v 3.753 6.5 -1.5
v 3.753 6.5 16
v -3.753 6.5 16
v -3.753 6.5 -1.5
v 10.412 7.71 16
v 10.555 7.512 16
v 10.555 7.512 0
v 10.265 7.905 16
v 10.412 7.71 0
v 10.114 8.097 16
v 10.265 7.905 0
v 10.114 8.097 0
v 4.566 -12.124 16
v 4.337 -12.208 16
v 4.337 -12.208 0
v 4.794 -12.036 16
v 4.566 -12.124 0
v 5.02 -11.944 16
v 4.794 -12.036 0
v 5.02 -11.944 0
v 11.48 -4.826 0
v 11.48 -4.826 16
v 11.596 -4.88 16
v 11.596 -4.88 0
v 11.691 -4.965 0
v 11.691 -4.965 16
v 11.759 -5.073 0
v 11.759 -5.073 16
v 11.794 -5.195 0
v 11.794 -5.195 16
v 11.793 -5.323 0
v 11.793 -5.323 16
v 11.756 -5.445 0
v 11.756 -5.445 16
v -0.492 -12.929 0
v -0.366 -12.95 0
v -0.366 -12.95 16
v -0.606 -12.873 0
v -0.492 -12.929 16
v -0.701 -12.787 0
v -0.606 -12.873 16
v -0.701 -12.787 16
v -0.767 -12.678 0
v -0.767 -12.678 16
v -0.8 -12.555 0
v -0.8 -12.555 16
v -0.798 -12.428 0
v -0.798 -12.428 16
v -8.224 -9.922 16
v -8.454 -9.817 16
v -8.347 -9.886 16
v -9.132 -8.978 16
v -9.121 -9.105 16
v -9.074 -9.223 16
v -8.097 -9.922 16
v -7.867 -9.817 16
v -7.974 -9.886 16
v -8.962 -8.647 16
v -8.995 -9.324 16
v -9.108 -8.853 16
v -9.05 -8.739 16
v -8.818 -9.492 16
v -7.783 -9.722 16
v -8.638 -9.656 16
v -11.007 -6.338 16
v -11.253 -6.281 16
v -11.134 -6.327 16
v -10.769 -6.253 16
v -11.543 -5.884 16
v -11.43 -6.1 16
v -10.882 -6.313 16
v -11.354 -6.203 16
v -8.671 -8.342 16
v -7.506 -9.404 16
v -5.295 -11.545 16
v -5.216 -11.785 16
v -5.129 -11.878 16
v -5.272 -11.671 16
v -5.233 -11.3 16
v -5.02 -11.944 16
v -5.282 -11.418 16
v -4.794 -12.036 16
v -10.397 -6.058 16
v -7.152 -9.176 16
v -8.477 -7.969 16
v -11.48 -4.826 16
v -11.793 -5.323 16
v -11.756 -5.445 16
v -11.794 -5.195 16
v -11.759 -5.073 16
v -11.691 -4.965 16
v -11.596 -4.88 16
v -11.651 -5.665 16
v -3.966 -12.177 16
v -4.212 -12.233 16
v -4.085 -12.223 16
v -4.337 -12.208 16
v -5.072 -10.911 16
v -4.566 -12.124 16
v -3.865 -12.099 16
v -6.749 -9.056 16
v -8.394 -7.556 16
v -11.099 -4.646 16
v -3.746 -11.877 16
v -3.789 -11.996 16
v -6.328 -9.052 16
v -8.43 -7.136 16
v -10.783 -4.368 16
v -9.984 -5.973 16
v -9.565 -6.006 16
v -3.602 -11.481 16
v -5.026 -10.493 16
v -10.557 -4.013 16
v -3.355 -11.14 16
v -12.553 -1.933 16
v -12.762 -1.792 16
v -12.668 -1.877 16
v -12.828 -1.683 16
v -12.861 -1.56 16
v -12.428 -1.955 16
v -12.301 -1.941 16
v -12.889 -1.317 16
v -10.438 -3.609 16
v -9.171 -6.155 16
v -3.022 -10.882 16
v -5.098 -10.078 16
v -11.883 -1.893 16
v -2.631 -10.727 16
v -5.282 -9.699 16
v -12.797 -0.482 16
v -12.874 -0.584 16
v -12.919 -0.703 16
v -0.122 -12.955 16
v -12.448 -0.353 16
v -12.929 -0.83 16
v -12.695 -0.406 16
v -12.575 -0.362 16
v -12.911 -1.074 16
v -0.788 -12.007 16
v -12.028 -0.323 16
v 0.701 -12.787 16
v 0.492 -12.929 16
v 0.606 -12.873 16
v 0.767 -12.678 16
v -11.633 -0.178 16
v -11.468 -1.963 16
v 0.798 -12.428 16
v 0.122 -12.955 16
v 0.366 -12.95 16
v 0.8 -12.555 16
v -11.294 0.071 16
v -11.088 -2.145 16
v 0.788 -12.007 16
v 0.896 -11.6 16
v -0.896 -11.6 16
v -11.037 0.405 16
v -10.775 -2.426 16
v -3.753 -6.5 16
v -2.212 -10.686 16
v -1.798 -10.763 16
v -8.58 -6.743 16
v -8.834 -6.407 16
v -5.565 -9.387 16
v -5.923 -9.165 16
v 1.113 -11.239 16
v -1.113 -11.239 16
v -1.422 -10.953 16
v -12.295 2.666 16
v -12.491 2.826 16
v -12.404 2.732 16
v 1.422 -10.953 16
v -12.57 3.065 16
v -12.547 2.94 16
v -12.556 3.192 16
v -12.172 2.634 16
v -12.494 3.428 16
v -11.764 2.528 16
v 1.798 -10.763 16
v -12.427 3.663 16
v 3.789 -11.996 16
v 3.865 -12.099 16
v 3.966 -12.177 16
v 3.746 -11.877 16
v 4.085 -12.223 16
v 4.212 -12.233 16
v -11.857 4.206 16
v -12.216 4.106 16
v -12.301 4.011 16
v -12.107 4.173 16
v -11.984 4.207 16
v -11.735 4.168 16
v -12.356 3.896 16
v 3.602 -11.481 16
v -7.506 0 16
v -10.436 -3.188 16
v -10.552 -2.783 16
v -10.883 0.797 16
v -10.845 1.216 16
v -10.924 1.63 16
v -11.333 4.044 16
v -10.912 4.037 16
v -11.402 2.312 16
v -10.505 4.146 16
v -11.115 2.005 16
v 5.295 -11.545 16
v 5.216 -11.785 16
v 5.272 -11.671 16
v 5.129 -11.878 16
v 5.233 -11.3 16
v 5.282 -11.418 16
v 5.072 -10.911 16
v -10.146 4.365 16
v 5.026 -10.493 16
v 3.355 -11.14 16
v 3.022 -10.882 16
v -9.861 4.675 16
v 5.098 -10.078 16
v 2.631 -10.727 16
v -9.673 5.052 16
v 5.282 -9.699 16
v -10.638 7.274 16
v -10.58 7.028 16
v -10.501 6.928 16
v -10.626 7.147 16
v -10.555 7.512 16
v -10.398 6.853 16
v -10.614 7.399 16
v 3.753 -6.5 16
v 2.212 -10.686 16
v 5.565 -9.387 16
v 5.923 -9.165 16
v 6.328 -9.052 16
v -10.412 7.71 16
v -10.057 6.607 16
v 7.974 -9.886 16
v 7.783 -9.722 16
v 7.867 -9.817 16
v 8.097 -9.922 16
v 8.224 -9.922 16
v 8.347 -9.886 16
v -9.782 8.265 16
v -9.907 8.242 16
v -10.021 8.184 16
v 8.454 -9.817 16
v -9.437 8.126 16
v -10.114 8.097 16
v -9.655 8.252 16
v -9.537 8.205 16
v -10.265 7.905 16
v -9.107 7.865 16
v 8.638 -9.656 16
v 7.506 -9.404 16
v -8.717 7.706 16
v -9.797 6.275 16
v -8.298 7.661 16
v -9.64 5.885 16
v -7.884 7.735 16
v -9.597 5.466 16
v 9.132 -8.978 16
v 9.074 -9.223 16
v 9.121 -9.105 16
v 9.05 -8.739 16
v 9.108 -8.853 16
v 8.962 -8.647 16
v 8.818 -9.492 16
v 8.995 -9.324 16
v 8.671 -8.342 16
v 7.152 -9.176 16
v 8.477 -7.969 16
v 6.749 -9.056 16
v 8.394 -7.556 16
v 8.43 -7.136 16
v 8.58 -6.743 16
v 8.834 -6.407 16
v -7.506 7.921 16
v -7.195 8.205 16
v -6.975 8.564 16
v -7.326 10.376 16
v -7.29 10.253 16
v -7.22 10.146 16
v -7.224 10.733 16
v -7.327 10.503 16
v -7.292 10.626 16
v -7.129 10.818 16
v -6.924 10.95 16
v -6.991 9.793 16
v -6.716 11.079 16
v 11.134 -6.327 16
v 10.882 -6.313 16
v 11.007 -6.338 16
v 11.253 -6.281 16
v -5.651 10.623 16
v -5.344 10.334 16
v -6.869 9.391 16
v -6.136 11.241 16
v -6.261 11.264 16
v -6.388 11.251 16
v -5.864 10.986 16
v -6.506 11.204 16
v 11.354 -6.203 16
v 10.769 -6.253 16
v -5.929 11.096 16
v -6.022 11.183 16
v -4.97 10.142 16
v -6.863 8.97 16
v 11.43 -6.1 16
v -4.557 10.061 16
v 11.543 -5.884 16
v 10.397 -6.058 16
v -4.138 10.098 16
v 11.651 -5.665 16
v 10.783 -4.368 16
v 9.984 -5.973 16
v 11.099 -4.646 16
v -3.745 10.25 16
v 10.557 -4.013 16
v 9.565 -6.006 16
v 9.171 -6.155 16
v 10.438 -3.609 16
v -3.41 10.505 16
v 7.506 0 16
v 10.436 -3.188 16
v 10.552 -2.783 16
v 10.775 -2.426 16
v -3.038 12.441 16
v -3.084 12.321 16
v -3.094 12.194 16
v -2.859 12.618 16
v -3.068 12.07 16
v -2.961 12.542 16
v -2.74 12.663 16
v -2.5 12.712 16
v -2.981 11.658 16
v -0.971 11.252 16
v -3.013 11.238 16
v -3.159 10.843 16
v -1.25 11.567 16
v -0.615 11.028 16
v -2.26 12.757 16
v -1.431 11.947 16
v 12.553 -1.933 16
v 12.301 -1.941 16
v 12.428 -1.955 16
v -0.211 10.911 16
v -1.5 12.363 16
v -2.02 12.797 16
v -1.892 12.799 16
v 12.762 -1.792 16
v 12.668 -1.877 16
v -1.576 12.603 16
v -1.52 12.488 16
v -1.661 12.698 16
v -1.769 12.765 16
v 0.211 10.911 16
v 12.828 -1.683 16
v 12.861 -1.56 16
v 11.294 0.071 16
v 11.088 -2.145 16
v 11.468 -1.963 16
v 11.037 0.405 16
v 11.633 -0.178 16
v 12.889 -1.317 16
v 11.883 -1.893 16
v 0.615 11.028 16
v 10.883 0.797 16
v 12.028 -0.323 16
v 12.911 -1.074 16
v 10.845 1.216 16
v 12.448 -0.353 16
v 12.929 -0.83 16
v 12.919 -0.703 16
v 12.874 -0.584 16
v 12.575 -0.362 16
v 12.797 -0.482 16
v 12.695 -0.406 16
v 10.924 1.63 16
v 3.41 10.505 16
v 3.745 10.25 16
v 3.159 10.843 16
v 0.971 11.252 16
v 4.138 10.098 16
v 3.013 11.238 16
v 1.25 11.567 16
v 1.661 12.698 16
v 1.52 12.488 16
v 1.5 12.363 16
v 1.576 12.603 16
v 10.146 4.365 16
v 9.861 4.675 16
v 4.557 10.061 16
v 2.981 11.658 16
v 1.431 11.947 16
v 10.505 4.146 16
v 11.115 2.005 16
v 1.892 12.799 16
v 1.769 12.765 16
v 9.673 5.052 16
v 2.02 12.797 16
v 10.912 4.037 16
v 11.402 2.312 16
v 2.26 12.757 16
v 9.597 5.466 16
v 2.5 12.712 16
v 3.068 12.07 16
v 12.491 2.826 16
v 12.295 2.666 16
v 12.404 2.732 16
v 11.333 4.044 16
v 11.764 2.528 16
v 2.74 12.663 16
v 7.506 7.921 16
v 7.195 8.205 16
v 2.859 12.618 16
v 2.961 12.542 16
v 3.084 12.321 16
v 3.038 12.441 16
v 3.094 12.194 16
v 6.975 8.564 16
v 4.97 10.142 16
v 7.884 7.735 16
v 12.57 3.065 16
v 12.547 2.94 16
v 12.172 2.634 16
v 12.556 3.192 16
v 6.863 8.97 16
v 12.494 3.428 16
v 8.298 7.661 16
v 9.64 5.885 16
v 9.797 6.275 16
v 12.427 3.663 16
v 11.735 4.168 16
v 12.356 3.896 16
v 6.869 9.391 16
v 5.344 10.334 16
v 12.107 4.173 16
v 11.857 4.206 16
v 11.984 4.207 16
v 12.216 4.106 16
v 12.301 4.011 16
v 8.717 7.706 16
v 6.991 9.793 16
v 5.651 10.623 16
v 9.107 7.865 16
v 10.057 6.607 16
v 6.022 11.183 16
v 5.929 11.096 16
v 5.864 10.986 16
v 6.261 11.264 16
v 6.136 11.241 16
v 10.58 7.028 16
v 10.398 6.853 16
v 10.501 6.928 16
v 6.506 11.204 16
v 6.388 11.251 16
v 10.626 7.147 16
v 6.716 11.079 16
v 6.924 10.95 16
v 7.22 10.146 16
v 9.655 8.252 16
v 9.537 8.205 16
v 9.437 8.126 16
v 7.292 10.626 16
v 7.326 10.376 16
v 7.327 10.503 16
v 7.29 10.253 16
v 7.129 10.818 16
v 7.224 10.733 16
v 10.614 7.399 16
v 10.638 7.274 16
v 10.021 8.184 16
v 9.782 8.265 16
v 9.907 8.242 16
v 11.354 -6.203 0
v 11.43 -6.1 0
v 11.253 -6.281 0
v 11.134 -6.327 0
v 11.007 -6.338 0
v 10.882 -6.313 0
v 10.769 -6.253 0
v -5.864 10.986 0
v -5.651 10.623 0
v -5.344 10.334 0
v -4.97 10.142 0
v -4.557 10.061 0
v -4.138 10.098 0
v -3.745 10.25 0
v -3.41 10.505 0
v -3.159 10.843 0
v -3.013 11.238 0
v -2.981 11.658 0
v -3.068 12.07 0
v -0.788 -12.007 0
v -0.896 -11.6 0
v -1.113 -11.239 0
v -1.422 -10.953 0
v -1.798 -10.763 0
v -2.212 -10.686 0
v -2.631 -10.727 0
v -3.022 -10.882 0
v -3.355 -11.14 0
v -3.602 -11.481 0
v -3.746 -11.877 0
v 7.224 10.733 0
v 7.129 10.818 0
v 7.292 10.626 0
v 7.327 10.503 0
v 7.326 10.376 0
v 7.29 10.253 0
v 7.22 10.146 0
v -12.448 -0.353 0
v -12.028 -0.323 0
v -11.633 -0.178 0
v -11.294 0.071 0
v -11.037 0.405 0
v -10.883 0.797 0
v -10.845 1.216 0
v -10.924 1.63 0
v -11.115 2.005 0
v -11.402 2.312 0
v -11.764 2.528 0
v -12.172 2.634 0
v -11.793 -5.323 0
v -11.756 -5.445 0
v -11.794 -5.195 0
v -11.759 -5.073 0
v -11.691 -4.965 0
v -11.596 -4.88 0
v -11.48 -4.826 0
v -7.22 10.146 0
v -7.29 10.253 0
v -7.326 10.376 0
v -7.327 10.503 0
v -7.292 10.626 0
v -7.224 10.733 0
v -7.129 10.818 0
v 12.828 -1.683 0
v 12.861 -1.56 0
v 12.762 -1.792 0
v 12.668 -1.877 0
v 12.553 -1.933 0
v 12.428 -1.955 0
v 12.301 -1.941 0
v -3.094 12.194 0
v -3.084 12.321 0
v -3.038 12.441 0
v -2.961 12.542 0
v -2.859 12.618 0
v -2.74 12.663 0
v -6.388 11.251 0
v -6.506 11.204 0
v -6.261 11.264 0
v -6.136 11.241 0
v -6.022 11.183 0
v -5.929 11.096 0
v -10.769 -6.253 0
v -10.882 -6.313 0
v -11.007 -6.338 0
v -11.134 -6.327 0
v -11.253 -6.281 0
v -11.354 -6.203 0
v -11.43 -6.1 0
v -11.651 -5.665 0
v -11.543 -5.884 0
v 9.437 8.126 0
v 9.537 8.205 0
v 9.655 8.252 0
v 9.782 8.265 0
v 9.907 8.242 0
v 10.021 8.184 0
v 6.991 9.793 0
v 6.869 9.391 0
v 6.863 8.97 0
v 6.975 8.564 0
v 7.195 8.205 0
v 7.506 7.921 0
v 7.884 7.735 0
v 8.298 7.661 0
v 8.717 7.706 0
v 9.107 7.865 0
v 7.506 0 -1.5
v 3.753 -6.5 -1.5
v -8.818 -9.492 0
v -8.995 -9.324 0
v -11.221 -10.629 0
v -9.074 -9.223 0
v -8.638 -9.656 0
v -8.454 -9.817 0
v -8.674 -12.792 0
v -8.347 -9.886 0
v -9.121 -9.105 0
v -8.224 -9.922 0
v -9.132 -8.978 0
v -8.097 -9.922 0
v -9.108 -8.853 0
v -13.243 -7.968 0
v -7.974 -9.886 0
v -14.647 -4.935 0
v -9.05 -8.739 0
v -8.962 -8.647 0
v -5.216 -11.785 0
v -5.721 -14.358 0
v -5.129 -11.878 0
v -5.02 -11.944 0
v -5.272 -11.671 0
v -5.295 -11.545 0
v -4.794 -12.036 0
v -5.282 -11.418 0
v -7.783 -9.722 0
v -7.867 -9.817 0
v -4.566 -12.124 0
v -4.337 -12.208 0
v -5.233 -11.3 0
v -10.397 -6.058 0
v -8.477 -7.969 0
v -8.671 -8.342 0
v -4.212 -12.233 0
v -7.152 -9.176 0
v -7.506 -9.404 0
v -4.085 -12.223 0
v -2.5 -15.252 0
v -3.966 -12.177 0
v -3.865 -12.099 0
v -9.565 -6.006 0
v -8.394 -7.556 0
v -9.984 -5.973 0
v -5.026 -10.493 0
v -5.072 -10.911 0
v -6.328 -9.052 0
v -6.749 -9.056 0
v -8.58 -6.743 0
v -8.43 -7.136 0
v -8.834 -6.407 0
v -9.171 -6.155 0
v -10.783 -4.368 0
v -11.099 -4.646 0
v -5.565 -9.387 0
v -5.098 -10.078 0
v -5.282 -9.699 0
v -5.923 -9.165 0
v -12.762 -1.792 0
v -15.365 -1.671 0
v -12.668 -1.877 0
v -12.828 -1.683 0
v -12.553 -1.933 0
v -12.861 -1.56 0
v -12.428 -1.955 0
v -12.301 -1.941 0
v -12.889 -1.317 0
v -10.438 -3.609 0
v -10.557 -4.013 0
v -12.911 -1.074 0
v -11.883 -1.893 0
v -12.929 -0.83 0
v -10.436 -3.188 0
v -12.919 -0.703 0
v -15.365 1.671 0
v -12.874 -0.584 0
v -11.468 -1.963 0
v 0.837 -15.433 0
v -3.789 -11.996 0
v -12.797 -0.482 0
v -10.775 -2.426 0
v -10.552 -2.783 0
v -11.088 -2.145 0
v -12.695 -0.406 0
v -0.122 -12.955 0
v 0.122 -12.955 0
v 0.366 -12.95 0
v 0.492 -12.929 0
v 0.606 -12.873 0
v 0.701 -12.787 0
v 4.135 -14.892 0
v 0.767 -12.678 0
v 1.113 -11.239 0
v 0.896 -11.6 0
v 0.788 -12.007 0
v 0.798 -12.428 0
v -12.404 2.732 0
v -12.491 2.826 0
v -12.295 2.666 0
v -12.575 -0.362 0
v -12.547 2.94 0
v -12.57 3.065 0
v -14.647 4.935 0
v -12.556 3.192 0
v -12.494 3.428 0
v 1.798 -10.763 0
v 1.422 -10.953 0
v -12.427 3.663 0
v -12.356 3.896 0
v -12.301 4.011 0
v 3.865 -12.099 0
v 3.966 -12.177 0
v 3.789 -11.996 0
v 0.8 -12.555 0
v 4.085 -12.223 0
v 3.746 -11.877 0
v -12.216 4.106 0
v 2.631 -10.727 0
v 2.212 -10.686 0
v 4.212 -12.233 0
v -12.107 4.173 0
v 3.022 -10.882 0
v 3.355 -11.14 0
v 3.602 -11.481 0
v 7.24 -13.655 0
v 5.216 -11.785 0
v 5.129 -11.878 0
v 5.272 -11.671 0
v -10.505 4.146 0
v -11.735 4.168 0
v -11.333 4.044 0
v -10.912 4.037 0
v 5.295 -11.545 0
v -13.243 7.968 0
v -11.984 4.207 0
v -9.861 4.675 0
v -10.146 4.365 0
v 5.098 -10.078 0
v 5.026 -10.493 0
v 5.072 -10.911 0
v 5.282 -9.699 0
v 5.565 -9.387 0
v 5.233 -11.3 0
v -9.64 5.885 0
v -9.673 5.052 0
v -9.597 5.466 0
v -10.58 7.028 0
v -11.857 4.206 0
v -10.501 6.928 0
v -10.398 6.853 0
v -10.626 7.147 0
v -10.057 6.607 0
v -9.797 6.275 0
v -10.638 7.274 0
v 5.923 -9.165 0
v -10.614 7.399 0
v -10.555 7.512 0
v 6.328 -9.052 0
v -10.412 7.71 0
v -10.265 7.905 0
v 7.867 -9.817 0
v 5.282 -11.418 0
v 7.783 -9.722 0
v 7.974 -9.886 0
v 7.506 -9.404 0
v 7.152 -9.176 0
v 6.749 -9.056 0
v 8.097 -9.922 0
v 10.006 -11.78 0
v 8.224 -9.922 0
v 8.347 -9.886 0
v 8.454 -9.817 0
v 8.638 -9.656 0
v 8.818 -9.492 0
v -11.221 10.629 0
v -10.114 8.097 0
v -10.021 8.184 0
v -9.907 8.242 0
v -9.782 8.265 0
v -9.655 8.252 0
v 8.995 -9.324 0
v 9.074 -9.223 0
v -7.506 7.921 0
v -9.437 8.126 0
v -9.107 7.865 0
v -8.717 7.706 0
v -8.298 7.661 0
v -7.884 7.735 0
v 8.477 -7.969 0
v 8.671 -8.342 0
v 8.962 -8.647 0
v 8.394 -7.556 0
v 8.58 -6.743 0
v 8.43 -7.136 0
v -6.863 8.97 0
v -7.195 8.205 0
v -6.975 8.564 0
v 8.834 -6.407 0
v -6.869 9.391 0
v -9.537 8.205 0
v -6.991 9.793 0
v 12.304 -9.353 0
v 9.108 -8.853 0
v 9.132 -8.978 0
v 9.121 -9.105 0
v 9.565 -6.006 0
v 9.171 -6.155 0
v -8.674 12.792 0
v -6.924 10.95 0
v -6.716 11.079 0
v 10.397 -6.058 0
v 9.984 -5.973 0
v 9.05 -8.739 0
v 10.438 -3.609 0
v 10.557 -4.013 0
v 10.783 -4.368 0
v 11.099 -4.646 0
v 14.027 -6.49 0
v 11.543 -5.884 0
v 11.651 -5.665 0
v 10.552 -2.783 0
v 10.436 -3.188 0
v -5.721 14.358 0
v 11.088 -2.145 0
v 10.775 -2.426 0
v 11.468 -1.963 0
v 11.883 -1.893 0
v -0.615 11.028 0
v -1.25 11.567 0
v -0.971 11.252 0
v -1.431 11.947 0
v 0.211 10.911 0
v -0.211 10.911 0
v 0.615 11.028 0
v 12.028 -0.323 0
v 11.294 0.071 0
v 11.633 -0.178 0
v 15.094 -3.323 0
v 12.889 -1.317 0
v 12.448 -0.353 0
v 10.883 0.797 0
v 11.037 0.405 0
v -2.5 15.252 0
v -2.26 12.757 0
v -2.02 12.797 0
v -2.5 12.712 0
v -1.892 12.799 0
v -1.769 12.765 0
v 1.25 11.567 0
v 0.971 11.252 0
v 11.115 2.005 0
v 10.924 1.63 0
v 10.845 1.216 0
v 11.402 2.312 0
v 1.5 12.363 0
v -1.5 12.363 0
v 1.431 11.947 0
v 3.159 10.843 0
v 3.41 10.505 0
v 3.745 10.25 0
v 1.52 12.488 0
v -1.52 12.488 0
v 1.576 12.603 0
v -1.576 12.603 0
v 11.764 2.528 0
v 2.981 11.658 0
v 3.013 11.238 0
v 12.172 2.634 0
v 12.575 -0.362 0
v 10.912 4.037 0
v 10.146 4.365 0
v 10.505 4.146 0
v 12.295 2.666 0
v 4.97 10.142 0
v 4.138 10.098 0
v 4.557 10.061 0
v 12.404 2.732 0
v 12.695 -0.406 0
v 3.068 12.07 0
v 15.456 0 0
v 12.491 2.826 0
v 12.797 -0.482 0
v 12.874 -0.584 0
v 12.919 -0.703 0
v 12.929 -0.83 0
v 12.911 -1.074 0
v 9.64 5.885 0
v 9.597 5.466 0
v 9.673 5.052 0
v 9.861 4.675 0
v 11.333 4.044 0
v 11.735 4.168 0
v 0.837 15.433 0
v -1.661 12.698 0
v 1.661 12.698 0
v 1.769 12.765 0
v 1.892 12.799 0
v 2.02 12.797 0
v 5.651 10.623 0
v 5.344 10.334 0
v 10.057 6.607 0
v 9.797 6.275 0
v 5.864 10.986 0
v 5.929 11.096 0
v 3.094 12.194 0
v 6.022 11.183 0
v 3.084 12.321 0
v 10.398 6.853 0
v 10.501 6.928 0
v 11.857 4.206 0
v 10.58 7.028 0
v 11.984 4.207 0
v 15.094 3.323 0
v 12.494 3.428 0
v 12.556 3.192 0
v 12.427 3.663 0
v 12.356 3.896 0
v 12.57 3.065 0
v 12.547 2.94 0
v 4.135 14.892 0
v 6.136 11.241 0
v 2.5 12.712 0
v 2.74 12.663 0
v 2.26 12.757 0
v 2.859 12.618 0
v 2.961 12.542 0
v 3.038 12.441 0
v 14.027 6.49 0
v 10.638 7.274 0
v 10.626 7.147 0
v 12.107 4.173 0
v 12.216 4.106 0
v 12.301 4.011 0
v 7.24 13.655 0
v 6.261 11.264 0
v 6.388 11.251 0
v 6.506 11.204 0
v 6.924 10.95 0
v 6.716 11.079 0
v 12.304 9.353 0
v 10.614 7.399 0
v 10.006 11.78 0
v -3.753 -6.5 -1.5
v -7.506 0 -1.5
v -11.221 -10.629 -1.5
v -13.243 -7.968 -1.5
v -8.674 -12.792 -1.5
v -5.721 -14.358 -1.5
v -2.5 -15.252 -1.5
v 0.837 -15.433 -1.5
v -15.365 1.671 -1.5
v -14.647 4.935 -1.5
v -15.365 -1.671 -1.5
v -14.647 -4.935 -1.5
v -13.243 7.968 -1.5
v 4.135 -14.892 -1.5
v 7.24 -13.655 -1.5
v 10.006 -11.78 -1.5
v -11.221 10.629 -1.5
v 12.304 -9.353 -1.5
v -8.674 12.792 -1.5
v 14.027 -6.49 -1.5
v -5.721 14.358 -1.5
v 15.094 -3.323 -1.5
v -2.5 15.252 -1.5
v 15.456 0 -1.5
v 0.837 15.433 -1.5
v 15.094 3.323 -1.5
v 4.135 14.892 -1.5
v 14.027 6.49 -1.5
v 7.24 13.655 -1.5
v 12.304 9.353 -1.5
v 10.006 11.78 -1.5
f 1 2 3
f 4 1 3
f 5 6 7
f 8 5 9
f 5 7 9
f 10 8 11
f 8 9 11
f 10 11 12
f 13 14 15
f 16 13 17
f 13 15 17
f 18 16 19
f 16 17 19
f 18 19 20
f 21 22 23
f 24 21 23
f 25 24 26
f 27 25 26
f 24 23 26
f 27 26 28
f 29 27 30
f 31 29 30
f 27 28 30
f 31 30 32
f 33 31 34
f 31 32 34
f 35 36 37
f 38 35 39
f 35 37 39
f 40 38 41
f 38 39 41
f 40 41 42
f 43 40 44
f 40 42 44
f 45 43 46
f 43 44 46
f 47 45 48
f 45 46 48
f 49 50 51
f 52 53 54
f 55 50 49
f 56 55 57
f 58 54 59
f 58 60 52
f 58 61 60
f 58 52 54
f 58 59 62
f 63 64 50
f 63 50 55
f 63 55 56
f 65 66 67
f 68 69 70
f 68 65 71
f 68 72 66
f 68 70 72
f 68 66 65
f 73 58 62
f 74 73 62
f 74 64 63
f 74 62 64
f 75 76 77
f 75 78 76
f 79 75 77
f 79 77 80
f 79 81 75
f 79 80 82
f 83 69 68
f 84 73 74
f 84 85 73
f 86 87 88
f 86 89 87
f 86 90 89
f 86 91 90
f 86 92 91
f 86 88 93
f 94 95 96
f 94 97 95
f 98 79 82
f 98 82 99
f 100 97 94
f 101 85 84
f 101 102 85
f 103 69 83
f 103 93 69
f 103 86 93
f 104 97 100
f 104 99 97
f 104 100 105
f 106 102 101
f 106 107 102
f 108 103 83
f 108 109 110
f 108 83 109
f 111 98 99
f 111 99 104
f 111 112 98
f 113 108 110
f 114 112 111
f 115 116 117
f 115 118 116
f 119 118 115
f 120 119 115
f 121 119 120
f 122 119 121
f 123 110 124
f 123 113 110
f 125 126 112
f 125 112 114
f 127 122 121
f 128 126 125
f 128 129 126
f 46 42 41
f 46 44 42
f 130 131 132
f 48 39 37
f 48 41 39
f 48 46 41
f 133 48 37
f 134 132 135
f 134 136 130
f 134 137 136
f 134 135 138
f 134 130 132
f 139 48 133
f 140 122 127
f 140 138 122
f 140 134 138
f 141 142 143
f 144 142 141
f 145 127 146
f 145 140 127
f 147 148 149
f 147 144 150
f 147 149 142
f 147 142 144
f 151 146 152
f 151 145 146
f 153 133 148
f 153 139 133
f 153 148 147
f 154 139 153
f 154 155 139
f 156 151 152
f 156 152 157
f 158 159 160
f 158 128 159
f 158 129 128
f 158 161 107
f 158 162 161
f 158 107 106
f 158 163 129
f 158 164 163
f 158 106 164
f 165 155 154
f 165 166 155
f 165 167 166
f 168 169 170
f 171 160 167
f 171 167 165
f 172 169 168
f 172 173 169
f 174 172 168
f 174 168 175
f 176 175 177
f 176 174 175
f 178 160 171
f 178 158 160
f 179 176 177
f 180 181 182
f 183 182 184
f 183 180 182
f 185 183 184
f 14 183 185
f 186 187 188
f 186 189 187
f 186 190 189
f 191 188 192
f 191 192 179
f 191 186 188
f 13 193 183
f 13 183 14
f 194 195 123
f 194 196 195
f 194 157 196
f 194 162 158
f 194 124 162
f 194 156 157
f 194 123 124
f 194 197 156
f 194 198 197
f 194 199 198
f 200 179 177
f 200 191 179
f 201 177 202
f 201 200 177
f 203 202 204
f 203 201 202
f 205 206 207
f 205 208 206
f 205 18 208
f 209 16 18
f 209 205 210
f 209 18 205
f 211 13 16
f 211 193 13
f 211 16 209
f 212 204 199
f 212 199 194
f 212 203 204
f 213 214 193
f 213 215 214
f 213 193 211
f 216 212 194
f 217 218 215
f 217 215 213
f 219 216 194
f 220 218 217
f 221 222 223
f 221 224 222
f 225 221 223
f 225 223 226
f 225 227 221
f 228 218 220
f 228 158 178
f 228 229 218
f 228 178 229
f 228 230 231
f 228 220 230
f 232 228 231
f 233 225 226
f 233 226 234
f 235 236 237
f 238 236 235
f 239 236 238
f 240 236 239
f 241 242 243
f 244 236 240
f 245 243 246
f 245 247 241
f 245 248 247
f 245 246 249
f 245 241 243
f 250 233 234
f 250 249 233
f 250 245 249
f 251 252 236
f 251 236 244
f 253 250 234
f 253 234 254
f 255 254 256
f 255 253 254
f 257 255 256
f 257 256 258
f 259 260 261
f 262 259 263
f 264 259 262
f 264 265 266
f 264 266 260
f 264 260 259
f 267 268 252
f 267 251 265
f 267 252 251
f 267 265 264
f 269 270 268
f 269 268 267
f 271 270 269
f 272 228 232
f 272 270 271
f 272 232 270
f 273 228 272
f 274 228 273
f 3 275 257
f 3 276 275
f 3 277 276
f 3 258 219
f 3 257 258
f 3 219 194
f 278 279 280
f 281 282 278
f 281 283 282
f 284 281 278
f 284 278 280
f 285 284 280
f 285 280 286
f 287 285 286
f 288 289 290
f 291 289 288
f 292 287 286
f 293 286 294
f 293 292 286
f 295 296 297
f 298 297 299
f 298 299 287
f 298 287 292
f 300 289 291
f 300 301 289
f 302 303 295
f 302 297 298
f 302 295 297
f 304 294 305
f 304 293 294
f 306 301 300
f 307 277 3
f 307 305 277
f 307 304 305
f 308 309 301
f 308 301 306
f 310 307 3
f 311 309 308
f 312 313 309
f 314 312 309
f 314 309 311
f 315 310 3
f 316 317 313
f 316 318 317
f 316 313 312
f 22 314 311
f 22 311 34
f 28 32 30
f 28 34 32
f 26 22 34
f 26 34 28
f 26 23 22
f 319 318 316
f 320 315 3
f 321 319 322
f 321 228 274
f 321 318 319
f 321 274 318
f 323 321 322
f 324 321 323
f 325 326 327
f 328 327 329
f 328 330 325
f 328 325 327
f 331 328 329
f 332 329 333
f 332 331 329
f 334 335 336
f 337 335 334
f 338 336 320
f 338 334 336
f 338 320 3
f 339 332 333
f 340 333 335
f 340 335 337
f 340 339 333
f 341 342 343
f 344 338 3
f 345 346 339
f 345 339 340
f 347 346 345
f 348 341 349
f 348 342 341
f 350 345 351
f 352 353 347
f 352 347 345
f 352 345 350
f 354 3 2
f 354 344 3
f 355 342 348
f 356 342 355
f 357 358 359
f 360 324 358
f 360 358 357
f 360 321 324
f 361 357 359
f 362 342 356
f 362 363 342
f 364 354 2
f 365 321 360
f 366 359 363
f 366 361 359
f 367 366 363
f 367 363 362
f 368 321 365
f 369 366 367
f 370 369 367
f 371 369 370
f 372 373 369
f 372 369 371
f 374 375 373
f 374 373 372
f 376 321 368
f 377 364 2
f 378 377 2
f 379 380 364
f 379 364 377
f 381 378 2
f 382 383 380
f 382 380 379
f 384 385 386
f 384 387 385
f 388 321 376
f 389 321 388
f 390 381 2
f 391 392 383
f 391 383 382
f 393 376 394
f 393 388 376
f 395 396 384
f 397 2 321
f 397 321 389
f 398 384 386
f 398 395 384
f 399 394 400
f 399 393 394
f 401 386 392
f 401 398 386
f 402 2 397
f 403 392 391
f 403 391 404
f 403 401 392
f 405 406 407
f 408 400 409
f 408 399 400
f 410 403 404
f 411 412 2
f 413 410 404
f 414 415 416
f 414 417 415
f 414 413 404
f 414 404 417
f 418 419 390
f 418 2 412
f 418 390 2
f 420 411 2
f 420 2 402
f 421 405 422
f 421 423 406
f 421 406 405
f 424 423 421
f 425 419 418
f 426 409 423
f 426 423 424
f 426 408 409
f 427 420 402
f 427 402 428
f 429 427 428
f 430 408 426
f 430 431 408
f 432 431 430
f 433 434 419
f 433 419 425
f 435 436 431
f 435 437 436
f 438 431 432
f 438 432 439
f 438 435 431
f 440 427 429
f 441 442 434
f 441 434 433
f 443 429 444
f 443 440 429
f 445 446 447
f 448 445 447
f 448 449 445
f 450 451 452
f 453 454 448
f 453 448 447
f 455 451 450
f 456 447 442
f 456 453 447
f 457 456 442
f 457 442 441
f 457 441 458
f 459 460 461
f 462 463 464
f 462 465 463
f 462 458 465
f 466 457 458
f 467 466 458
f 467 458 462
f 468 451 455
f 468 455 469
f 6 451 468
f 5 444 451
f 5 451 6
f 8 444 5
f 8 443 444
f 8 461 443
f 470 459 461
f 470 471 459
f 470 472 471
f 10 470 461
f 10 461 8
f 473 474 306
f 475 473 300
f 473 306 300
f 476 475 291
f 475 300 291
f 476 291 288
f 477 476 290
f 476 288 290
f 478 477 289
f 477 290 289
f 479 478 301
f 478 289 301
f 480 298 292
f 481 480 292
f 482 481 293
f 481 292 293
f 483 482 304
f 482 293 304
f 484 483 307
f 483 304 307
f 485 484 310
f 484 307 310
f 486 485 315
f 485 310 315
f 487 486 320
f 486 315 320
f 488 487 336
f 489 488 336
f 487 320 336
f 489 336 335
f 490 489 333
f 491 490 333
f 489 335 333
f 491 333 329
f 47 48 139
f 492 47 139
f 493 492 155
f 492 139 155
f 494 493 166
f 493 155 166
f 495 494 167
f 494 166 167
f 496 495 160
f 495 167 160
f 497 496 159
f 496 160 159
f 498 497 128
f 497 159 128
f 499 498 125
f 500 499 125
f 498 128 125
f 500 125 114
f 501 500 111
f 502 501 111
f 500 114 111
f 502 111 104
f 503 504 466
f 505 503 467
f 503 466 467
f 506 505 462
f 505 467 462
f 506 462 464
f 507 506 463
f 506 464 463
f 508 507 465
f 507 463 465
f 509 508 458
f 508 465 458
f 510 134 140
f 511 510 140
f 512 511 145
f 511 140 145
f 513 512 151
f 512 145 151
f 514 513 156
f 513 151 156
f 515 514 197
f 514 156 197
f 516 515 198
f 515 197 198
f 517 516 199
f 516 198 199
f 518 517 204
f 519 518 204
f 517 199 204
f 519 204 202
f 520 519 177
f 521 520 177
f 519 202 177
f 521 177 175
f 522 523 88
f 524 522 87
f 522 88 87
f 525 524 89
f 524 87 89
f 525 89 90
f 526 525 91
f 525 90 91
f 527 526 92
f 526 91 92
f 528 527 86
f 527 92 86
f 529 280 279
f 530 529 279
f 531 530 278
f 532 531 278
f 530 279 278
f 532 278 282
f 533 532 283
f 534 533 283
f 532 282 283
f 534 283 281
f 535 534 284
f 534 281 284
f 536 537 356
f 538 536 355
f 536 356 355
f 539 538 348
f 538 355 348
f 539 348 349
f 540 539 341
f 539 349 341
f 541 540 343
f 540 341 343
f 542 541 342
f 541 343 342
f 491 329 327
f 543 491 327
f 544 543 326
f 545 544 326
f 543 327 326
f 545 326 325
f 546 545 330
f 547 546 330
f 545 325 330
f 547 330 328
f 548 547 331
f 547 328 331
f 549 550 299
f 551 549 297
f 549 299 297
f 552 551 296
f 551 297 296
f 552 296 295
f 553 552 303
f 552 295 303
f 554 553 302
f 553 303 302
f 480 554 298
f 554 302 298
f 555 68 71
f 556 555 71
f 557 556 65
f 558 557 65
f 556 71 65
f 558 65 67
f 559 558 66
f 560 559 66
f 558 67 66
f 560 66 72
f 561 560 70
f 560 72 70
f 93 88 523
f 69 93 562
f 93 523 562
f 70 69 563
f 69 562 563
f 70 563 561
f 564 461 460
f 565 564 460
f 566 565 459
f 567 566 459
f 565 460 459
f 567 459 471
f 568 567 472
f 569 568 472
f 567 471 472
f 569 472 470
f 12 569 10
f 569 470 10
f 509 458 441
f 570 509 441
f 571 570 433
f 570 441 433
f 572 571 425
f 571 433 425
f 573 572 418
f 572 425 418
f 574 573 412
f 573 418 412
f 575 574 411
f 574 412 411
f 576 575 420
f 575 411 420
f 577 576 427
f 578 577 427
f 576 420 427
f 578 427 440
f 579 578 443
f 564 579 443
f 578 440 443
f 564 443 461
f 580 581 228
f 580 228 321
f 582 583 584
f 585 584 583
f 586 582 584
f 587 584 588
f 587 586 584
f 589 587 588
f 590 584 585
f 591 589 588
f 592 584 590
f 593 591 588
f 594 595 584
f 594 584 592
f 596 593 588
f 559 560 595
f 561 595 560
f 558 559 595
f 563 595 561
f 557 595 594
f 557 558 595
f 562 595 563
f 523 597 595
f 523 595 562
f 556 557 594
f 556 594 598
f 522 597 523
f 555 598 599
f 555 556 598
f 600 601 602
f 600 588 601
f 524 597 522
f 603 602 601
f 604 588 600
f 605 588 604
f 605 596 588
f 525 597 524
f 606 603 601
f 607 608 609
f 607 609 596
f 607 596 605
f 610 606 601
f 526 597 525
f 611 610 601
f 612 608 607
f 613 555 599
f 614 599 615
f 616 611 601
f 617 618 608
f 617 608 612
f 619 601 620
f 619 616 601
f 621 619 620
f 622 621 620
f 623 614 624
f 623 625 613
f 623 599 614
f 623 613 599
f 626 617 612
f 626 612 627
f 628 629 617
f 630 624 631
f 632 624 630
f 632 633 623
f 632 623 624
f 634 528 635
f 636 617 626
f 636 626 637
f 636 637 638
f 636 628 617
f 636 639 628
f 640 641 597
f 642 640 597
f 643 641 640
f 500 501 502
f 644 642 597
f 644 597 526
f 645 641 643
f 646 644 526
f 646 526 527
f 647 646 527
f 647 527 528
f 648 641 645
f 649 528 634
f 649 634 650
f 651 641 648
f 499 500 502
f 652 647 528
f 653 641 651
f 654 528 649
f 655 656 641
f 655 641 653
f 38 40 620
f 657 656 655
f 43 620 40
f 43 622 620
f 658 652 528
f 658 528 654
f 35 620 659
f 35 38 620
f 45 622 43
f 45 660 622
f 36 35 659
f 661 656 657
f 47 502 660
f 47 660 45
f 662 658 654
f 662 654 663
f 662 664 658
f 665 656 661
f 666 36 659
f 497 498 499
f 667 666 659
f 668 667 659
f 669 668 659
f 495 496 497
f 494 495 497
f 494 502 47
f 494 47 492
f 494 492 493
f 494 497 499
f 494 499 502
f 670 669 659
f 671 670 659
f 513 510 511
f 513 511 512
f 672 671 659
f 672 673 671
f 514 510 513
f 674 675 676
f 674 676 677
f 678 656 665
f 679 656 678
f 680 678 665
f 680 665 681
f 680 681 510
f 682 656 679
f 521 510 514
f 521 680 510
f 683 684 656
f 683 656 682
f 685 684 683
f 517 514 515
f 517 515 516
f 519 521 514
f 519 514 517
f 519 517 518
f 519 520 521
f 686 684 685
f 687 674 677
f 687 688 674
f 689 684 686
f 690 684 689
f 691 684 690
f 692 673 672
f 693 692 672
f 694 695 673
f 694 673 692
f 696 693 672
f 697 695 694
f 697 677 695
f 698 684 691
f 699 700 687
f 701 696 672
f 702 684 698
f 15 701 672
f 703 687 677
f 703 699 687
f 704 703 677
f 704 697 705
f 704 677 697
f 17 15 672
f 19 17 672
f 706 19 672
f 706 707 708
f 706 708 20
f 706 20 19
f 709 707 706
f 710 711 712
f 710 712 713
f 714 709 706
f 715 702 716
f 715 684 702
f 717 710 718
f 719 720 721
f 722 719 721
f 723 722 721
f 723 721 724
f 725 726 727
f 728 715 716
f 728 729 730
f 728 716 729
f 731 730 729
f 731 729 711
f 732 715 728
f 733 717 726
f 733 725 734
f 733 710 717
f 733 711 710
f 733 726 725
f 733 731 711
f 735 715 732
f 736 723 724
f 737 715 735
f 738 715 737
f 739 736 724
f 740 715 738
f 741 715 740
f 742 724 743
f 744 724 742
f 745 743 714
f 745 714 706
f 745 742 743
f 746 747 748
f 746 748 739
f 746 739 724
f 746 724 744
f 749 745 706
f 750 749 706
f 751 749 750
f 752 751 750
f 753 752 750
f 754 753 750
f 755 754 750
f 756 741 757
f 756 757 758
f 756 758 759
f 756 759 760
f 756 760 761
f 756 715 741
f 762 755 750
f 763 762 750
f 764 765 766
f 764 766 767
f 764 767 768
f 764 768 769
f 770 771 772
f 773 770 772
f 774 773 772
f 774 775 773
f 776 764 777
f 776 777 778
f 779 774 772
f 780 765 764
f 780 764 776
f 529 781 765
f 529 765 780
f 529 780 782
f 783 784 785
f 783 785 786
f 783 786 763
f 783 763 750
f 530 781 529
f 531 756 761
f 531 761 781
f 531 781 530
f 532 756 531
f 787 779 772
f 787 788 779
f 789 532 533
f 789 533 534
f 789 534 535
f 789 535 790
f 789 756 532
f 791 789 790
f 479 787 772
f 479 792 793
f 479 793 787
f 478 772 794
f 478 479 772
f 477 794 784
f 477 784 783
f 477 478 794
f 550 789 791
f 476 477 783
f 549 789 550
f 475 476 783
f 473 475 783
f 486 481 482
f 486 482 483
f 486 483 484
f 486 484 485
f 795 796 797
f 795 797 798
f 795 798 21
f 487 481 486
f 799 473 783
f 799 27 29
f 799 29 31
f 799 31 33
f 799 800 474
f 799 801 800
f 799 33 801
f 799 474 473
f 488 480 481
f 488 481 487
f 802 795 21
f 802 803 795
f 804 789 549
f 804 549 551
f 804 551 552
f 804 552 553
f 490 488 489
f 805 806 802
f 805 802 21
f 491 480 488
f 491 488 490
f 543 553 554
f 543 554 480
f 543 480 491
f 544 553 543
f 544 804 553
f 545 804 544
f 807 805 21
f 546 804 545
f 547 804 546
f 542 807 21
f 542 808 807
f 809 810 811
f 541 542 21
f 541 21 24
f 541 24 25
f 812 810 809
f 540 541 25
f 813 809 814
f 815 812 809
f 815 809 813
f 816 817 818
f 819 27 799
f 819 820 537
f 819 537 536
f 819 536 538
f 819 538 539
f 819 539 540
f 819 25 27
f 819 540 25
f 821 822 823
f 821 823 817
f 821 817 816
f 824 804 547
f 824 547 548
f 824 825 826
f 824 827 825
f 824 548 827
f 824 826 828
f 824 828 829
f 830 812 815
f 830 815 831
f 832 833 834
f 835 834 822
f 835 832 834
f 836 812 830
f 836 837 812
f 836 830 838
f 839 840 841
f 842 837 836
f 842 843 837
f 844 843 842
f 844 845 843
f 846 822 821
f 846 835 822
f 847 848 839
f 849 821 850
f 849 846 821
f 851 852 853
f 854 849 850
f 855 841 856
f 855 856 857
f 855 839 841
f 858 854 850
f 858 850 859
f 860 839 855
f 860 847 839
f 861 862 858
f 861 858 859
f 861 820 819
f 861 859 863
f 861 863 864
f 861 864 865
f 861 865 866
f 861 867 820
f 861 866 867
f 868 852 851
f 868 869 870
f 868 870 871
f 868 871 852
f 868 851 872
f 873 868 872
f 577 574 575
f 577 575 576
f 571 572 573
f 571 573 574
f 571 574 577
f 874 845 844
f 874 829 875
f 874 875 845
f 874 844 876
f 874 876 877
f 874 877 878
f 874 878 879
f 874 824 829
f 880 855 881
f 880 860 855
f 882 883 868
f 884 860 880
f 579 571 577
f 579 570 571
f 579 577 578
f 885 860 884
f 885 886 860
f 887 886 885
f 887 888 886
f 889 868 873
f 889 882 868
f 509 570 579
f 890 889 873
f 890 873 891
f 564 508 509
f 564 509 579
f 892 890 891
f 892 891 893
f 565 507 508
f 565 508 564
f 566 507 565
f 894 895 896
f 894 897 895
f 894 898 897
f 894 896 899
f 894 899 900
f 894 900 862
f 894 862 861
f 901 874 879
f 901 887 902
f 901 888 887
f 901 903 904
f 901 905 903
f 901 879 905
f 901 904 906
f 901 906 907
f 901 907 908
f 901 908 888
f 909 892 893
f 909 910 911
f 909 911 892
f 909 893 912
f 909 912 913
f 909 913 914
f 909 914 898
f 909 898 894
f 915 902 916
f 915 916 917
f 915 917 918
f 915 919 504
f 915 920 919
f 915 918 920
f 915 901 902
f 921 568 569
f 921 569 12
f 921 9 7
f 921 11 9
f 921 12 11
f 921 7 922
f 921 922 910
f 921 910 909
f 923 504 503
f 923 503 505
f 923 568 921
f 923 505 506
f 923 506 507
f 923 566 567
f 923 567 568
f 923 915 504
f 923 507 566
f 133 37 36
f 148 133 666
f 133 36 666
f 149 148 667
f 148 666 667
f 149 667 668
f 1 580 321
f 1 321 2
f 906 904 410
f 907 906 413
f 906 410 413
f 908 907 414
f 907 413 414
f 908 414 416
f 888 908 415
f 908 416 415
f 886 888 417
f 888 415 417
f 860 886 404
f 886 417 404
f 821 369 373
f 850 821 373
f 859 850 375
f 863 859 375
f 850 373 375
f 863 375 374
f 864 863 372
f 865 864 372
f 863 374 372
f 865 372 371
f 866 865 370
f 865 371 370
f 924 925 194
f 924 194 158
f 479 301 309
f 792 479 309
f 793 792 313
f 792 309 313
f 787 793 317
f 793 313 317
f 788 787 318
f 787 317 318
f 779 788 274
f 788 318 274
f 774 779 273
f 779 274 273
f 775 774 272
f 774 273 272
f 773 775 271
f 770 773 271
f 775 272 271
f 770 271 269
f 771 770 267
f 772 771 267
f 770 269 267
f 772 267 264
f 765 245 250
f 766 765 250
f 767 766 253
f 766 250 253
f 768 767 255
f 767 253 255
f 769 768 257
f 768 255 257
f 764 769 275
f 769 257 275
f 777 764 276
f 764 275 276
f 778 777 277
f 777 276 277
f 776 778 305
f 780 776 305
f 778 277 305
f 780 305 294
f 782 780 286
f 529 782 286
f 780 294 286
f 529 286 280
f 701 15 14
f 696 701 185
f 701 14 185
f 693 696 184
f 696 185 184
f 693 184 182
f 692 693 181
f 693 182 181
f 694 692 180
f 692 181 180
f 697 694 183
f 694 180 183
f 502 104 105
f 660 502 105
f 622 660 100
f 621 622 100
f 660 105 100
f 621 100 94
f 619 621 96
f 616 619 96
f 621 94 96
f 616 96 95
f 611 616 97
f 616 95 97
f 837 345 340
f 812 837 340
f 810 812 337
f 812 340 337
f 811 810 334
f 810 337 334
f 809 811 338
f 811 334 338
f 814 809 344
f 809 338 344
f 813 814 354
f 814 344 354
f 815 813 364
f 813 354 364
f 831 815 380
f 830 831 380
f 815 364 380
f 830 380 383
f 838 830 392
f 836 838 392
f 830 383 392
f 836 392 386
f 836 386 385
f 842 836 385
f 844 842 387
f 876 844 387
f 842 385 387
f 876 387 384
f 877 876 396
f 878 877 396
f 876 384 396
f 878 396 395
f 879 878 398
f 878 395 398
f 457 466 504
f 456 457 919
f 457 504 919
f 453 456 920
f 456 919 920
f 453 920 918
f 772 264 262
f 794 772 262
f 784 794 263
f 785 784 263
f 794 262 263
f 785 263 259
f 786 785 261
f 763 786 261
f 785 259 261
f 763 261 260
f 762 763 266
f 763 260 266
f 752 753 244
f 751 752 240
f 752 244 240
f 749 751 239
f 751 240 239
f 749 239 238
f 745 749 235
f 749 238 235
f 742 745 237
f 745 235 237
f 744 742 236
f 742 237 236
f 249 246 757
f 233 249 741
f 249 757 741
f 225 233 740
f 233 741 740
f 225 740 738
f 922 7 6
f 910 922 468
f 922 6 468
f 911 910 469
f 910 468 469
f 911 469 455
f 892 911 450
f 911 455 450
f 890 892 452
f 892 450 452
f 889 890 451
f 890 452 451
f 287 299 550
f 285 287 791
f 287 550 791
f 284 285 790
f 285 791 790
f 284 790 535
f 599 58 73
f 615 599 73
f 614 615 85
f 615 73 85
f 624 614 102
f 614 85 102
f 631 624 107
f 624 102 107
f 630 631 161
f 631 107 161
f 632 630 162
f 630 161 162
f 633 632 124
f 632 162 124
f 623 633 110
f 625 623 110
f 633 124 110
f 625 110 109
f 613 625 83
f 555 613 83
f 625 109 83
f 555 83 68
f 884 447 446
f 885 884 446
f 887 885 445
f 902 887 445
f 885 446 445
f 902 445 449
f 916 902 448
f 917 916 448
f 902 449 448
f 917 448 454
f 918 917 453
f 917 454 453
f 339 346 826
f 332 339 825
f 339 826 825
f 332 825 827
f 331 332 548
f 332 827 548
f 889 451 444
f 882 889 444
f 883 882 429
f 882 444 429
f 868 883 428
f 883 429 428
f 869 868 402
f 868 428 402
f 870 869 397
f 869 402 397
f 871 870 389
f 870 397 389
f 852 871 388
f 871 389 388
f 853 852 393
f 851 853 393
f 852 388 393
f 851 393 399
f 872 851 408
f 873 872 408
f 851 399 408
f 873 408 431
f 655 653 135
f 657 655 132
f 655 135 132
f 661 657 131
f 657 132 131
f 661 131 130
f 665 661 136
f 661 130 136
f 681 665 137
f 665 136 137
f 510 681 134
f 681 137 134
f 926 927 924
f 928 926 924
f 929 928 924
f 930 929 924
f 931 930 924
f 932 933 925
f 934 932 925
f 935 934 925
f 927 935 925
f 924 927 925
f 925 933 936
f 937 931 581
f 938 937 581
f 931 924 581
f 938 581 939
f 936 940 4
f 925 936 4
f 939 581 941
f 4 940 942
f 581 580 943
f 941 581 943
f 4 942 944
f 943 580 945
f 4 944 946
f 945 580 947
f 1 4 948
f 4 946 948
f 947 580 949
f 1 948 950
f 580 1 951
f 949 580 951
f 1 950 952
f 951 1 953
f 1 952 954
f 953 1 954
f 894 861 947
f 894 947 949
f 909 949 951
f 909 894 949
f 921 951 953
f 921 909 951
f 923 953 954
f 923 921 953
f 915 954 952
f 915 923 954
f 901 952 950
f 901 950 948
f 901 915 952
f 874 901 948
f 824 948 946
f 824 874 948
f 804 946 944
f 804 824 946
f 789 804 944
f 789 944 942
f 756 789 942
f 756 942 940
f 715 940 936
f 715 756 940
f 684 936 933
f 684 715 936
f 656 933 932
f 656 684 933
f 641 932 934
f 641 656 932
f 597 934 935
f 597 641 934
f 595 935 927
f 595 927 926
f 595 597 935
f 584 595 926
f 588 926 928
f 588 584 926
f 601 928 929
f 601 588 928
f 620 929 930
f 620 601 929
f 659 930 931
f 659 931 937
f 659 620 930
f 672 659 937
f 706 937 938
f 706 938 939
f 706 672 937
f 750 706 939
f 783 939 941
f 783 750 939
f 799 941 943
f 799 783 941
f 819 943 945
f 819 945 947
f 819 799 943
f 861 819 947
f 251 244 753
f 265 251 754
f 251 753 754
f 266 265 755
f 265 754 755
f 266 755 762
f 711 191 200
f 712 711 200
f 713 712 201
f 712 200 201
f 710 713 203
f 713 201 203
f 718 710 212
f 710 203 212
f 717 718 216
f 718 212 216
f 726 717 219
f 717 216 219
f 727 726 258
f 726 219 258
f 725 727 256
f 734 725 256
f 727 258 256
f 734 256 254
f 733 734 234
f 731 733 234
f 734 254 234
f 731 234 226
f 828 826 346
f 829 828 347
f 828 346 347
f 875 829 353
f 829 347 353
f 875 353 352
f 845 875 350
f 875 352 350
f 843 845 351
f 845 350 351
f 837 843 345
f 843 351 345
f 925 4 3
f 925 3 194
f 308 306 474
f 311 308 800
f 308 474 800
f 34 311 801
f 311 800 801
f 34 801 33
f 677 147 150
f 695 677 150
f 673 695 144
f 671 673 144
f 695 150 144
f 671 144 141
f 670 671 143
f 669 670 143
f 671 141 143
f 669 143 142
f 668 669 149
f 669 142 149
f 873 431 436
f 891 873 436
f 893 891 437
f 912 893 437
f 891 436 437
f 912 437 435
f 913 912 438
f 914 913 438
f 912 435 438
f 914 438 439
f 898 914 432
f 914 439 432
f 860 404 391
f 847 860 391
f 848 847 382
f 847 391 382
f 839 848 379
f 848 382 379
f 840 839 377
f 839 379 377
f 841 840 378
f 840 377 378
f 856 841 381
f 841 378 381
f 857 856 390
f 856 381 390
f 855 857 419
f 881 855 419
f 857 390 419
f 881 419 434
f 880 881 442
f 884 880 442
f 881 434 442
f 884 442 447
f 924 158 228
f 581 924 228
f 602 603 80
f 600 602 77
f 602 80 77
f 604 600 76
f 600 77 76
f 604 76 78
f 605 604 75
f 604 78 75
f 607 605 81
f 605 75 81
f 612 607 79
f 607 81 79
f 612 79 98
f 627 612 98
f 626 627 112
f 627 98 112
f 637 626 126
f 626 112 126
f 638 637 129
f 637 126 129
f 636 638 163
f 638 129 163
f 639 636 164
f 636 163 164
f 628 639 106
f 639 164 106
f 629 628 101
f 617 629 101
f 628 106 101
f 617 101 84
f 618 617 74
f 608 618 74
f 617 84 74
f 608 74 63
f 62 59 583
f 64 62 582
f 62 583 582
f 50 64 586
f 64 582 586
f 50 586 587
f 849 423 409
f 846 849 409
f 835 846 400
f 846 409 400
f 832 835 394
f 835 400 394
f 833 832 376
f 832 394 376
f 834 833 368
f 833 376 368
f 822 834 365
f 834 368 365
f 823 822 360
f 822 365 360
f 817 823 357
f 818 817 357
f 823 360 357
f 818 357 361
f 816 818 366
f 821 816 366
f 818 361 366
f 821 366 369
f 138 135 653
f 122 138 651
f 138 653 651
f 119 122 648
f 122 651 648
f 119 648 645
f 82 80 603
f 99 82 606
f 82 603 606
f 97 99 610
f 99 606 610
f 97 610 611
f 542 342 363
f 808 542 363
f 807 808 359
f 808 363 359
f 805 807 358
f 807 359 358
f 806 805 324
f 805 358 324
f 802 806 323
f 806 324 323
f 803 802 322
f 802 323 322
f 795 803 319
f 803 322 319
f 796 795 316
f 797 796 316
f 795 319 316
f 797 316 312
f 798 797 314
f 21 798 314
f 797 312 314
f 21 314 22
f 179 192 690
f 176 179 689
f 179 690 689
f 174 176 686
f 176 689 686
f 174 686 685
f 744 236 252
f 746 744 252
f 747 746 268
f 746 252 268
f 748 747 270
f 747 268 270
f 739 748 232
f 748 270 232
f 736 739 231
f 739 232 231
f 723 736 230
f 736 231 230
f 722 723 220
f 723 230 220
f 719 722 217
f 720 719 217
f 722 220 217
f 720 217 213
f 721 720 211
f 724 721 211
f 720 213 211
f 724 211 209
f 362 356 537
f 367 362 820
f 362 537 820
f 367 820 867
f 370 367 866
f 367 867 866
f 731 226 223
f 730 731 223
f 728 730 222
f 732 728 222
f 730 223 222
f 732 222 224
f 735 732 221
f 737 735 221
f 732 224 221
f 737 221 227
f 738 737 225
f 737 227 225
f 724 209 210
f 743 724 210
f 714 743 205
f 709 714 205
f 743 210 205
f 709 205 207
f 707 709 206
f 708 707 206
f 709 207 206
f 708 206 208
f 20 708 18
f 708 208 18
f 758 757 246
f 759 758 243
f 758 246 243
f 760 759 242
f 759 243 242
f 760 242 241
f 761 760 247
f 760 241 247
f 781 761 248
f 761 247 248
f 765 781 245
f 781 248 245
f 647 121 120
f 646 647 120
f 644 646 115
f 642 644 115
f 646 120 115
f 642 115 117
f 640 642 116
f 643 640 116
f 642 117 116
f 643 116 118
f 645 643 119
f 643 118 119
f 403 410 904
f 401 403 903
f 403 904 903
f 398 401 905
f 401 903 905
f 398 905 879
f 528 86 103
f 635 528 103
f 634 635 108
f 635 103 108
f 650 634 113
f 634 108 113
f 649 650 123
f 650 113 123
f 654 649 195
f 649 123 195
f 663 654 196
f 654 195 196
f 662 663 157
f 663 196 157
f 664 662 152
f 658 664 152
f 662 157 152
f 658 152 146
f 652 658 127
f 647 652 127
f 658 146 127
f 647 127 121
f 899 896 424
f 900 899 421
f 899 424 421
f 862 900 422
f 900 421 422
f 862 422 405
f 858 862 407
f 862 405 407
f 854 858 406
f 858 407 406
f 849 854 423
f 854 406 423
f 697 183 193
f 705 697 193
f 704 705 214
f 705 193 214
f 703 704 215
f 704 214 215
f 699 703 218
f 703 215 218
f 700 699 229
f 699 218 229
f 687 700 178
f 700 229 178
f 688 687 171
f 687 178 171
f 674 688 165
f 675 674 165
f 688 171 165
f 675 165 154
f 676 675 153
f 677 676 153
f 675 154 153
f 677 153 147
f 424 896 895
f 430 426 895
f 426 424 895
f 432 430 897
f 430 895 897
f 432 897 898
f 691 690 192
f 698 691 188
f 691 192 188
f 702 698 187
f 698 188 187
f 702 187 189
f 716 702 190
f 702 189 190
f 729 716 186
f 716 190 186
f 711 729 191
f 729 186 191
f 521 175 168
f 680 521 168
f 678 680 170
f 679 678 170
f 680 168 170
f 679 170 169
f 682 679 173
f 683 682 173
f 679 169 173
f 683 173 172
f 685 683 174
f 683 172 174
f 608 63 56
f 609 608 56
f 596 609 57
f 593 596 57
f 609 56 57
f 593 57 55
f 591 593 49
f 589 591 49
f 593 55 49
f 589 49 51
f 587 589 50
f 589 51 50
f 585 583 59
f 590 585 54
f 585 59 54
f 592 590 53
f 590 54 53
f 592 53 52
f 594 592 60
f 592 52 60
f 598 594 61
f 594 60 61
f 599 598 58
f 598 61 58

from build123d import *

# Parameters (mm, degrees)
F2_R            = 12.9556701783
F3_DEPTH        = 16
F5_DEPTH        = 16
F5_COPIES_COUNT = 17
F8_R            = 15.4556701783
F8_R_2          = 12.9556701783
F9_DEPTH        = 1.5
F10_DEPTH       = 17.501


# Not quite as in the source:
# - a feature of the source that left no trace in its solid (it failed there, or was rolled back) is left out
# - a pattern or mirror of a feature is missing from the dataset's text; its kind, count and spacing are read off the source's solid


with BuildPart() as f3:
    # F2 (on Top) → F3 (new body)
    with BuildSketch(Plane.XY):
        Circle(F2_R)
    extrude(amount=F3_DEPTH)

    # F4 (on face) → F5 (cut, through all)
    with BuildSketch(Plane.XY.offset(16)):
        with BuildLine():
            ThreePointArc((-2.019679411, 12.797276462), (-1.6609629062, 12.6980751446), (-1.4996370898, 12.362676258))
            ThreePointArc((-1.4996370898, 12.362676258), (0, 10.8956701783), (1.4996370898, 12.362676258))
            ThreePointArc((1.4996370898, 12.362676258), (1.6609629062, 12.6980751446), (2.019679411, 12.797276462))
            ThreePointArc((2.019679411, 12.797276462), (0, 12.9556701783), (-2.019679411, 12.797276462))
        make_face()
    f5 = extrude(amount=-F5_DEPTH, mode=Mode.SUBTRACT)

    # F5_copies: F5 ×17 about axis
    f5_copies_axis = Axis((0, 0, 0), (0, 0, 1))
    for i in range(1, F5_COPIES_COUNT):
        add(f5.rotate(f5_copies_axis, i * 360 / F5_COPIES_COUNT), mode=Mode.SUBTRACT)

    # F8 (on face) + F2 (on Top) → F9 (join)
    with BuildSketch(Plane.XY):
        Circle(F8_R)
        Circle(F8_R_2, mode=Mode.SUBTRACT)
    with BuildSketch(Plane.XY):
        Circle(F2_R)
    extrude(amount=-F9_DEPTH)

    # F7 (on face) → F10 (cut, through all)
    with BuildSketch(Plane.XY.offset(16)):
        Polygon((3.7527767497, 6.5), (-3.7527767497, 6.5), (-7.5055534995, 0), (-3.7527767497, -6.5), (3.7527767497, -6.5), (7.5055534995, 0), align=None)
    extrude(amount=-F10_DEPTH, mode=Mode.SUBTRACT)


solid = f3.part
